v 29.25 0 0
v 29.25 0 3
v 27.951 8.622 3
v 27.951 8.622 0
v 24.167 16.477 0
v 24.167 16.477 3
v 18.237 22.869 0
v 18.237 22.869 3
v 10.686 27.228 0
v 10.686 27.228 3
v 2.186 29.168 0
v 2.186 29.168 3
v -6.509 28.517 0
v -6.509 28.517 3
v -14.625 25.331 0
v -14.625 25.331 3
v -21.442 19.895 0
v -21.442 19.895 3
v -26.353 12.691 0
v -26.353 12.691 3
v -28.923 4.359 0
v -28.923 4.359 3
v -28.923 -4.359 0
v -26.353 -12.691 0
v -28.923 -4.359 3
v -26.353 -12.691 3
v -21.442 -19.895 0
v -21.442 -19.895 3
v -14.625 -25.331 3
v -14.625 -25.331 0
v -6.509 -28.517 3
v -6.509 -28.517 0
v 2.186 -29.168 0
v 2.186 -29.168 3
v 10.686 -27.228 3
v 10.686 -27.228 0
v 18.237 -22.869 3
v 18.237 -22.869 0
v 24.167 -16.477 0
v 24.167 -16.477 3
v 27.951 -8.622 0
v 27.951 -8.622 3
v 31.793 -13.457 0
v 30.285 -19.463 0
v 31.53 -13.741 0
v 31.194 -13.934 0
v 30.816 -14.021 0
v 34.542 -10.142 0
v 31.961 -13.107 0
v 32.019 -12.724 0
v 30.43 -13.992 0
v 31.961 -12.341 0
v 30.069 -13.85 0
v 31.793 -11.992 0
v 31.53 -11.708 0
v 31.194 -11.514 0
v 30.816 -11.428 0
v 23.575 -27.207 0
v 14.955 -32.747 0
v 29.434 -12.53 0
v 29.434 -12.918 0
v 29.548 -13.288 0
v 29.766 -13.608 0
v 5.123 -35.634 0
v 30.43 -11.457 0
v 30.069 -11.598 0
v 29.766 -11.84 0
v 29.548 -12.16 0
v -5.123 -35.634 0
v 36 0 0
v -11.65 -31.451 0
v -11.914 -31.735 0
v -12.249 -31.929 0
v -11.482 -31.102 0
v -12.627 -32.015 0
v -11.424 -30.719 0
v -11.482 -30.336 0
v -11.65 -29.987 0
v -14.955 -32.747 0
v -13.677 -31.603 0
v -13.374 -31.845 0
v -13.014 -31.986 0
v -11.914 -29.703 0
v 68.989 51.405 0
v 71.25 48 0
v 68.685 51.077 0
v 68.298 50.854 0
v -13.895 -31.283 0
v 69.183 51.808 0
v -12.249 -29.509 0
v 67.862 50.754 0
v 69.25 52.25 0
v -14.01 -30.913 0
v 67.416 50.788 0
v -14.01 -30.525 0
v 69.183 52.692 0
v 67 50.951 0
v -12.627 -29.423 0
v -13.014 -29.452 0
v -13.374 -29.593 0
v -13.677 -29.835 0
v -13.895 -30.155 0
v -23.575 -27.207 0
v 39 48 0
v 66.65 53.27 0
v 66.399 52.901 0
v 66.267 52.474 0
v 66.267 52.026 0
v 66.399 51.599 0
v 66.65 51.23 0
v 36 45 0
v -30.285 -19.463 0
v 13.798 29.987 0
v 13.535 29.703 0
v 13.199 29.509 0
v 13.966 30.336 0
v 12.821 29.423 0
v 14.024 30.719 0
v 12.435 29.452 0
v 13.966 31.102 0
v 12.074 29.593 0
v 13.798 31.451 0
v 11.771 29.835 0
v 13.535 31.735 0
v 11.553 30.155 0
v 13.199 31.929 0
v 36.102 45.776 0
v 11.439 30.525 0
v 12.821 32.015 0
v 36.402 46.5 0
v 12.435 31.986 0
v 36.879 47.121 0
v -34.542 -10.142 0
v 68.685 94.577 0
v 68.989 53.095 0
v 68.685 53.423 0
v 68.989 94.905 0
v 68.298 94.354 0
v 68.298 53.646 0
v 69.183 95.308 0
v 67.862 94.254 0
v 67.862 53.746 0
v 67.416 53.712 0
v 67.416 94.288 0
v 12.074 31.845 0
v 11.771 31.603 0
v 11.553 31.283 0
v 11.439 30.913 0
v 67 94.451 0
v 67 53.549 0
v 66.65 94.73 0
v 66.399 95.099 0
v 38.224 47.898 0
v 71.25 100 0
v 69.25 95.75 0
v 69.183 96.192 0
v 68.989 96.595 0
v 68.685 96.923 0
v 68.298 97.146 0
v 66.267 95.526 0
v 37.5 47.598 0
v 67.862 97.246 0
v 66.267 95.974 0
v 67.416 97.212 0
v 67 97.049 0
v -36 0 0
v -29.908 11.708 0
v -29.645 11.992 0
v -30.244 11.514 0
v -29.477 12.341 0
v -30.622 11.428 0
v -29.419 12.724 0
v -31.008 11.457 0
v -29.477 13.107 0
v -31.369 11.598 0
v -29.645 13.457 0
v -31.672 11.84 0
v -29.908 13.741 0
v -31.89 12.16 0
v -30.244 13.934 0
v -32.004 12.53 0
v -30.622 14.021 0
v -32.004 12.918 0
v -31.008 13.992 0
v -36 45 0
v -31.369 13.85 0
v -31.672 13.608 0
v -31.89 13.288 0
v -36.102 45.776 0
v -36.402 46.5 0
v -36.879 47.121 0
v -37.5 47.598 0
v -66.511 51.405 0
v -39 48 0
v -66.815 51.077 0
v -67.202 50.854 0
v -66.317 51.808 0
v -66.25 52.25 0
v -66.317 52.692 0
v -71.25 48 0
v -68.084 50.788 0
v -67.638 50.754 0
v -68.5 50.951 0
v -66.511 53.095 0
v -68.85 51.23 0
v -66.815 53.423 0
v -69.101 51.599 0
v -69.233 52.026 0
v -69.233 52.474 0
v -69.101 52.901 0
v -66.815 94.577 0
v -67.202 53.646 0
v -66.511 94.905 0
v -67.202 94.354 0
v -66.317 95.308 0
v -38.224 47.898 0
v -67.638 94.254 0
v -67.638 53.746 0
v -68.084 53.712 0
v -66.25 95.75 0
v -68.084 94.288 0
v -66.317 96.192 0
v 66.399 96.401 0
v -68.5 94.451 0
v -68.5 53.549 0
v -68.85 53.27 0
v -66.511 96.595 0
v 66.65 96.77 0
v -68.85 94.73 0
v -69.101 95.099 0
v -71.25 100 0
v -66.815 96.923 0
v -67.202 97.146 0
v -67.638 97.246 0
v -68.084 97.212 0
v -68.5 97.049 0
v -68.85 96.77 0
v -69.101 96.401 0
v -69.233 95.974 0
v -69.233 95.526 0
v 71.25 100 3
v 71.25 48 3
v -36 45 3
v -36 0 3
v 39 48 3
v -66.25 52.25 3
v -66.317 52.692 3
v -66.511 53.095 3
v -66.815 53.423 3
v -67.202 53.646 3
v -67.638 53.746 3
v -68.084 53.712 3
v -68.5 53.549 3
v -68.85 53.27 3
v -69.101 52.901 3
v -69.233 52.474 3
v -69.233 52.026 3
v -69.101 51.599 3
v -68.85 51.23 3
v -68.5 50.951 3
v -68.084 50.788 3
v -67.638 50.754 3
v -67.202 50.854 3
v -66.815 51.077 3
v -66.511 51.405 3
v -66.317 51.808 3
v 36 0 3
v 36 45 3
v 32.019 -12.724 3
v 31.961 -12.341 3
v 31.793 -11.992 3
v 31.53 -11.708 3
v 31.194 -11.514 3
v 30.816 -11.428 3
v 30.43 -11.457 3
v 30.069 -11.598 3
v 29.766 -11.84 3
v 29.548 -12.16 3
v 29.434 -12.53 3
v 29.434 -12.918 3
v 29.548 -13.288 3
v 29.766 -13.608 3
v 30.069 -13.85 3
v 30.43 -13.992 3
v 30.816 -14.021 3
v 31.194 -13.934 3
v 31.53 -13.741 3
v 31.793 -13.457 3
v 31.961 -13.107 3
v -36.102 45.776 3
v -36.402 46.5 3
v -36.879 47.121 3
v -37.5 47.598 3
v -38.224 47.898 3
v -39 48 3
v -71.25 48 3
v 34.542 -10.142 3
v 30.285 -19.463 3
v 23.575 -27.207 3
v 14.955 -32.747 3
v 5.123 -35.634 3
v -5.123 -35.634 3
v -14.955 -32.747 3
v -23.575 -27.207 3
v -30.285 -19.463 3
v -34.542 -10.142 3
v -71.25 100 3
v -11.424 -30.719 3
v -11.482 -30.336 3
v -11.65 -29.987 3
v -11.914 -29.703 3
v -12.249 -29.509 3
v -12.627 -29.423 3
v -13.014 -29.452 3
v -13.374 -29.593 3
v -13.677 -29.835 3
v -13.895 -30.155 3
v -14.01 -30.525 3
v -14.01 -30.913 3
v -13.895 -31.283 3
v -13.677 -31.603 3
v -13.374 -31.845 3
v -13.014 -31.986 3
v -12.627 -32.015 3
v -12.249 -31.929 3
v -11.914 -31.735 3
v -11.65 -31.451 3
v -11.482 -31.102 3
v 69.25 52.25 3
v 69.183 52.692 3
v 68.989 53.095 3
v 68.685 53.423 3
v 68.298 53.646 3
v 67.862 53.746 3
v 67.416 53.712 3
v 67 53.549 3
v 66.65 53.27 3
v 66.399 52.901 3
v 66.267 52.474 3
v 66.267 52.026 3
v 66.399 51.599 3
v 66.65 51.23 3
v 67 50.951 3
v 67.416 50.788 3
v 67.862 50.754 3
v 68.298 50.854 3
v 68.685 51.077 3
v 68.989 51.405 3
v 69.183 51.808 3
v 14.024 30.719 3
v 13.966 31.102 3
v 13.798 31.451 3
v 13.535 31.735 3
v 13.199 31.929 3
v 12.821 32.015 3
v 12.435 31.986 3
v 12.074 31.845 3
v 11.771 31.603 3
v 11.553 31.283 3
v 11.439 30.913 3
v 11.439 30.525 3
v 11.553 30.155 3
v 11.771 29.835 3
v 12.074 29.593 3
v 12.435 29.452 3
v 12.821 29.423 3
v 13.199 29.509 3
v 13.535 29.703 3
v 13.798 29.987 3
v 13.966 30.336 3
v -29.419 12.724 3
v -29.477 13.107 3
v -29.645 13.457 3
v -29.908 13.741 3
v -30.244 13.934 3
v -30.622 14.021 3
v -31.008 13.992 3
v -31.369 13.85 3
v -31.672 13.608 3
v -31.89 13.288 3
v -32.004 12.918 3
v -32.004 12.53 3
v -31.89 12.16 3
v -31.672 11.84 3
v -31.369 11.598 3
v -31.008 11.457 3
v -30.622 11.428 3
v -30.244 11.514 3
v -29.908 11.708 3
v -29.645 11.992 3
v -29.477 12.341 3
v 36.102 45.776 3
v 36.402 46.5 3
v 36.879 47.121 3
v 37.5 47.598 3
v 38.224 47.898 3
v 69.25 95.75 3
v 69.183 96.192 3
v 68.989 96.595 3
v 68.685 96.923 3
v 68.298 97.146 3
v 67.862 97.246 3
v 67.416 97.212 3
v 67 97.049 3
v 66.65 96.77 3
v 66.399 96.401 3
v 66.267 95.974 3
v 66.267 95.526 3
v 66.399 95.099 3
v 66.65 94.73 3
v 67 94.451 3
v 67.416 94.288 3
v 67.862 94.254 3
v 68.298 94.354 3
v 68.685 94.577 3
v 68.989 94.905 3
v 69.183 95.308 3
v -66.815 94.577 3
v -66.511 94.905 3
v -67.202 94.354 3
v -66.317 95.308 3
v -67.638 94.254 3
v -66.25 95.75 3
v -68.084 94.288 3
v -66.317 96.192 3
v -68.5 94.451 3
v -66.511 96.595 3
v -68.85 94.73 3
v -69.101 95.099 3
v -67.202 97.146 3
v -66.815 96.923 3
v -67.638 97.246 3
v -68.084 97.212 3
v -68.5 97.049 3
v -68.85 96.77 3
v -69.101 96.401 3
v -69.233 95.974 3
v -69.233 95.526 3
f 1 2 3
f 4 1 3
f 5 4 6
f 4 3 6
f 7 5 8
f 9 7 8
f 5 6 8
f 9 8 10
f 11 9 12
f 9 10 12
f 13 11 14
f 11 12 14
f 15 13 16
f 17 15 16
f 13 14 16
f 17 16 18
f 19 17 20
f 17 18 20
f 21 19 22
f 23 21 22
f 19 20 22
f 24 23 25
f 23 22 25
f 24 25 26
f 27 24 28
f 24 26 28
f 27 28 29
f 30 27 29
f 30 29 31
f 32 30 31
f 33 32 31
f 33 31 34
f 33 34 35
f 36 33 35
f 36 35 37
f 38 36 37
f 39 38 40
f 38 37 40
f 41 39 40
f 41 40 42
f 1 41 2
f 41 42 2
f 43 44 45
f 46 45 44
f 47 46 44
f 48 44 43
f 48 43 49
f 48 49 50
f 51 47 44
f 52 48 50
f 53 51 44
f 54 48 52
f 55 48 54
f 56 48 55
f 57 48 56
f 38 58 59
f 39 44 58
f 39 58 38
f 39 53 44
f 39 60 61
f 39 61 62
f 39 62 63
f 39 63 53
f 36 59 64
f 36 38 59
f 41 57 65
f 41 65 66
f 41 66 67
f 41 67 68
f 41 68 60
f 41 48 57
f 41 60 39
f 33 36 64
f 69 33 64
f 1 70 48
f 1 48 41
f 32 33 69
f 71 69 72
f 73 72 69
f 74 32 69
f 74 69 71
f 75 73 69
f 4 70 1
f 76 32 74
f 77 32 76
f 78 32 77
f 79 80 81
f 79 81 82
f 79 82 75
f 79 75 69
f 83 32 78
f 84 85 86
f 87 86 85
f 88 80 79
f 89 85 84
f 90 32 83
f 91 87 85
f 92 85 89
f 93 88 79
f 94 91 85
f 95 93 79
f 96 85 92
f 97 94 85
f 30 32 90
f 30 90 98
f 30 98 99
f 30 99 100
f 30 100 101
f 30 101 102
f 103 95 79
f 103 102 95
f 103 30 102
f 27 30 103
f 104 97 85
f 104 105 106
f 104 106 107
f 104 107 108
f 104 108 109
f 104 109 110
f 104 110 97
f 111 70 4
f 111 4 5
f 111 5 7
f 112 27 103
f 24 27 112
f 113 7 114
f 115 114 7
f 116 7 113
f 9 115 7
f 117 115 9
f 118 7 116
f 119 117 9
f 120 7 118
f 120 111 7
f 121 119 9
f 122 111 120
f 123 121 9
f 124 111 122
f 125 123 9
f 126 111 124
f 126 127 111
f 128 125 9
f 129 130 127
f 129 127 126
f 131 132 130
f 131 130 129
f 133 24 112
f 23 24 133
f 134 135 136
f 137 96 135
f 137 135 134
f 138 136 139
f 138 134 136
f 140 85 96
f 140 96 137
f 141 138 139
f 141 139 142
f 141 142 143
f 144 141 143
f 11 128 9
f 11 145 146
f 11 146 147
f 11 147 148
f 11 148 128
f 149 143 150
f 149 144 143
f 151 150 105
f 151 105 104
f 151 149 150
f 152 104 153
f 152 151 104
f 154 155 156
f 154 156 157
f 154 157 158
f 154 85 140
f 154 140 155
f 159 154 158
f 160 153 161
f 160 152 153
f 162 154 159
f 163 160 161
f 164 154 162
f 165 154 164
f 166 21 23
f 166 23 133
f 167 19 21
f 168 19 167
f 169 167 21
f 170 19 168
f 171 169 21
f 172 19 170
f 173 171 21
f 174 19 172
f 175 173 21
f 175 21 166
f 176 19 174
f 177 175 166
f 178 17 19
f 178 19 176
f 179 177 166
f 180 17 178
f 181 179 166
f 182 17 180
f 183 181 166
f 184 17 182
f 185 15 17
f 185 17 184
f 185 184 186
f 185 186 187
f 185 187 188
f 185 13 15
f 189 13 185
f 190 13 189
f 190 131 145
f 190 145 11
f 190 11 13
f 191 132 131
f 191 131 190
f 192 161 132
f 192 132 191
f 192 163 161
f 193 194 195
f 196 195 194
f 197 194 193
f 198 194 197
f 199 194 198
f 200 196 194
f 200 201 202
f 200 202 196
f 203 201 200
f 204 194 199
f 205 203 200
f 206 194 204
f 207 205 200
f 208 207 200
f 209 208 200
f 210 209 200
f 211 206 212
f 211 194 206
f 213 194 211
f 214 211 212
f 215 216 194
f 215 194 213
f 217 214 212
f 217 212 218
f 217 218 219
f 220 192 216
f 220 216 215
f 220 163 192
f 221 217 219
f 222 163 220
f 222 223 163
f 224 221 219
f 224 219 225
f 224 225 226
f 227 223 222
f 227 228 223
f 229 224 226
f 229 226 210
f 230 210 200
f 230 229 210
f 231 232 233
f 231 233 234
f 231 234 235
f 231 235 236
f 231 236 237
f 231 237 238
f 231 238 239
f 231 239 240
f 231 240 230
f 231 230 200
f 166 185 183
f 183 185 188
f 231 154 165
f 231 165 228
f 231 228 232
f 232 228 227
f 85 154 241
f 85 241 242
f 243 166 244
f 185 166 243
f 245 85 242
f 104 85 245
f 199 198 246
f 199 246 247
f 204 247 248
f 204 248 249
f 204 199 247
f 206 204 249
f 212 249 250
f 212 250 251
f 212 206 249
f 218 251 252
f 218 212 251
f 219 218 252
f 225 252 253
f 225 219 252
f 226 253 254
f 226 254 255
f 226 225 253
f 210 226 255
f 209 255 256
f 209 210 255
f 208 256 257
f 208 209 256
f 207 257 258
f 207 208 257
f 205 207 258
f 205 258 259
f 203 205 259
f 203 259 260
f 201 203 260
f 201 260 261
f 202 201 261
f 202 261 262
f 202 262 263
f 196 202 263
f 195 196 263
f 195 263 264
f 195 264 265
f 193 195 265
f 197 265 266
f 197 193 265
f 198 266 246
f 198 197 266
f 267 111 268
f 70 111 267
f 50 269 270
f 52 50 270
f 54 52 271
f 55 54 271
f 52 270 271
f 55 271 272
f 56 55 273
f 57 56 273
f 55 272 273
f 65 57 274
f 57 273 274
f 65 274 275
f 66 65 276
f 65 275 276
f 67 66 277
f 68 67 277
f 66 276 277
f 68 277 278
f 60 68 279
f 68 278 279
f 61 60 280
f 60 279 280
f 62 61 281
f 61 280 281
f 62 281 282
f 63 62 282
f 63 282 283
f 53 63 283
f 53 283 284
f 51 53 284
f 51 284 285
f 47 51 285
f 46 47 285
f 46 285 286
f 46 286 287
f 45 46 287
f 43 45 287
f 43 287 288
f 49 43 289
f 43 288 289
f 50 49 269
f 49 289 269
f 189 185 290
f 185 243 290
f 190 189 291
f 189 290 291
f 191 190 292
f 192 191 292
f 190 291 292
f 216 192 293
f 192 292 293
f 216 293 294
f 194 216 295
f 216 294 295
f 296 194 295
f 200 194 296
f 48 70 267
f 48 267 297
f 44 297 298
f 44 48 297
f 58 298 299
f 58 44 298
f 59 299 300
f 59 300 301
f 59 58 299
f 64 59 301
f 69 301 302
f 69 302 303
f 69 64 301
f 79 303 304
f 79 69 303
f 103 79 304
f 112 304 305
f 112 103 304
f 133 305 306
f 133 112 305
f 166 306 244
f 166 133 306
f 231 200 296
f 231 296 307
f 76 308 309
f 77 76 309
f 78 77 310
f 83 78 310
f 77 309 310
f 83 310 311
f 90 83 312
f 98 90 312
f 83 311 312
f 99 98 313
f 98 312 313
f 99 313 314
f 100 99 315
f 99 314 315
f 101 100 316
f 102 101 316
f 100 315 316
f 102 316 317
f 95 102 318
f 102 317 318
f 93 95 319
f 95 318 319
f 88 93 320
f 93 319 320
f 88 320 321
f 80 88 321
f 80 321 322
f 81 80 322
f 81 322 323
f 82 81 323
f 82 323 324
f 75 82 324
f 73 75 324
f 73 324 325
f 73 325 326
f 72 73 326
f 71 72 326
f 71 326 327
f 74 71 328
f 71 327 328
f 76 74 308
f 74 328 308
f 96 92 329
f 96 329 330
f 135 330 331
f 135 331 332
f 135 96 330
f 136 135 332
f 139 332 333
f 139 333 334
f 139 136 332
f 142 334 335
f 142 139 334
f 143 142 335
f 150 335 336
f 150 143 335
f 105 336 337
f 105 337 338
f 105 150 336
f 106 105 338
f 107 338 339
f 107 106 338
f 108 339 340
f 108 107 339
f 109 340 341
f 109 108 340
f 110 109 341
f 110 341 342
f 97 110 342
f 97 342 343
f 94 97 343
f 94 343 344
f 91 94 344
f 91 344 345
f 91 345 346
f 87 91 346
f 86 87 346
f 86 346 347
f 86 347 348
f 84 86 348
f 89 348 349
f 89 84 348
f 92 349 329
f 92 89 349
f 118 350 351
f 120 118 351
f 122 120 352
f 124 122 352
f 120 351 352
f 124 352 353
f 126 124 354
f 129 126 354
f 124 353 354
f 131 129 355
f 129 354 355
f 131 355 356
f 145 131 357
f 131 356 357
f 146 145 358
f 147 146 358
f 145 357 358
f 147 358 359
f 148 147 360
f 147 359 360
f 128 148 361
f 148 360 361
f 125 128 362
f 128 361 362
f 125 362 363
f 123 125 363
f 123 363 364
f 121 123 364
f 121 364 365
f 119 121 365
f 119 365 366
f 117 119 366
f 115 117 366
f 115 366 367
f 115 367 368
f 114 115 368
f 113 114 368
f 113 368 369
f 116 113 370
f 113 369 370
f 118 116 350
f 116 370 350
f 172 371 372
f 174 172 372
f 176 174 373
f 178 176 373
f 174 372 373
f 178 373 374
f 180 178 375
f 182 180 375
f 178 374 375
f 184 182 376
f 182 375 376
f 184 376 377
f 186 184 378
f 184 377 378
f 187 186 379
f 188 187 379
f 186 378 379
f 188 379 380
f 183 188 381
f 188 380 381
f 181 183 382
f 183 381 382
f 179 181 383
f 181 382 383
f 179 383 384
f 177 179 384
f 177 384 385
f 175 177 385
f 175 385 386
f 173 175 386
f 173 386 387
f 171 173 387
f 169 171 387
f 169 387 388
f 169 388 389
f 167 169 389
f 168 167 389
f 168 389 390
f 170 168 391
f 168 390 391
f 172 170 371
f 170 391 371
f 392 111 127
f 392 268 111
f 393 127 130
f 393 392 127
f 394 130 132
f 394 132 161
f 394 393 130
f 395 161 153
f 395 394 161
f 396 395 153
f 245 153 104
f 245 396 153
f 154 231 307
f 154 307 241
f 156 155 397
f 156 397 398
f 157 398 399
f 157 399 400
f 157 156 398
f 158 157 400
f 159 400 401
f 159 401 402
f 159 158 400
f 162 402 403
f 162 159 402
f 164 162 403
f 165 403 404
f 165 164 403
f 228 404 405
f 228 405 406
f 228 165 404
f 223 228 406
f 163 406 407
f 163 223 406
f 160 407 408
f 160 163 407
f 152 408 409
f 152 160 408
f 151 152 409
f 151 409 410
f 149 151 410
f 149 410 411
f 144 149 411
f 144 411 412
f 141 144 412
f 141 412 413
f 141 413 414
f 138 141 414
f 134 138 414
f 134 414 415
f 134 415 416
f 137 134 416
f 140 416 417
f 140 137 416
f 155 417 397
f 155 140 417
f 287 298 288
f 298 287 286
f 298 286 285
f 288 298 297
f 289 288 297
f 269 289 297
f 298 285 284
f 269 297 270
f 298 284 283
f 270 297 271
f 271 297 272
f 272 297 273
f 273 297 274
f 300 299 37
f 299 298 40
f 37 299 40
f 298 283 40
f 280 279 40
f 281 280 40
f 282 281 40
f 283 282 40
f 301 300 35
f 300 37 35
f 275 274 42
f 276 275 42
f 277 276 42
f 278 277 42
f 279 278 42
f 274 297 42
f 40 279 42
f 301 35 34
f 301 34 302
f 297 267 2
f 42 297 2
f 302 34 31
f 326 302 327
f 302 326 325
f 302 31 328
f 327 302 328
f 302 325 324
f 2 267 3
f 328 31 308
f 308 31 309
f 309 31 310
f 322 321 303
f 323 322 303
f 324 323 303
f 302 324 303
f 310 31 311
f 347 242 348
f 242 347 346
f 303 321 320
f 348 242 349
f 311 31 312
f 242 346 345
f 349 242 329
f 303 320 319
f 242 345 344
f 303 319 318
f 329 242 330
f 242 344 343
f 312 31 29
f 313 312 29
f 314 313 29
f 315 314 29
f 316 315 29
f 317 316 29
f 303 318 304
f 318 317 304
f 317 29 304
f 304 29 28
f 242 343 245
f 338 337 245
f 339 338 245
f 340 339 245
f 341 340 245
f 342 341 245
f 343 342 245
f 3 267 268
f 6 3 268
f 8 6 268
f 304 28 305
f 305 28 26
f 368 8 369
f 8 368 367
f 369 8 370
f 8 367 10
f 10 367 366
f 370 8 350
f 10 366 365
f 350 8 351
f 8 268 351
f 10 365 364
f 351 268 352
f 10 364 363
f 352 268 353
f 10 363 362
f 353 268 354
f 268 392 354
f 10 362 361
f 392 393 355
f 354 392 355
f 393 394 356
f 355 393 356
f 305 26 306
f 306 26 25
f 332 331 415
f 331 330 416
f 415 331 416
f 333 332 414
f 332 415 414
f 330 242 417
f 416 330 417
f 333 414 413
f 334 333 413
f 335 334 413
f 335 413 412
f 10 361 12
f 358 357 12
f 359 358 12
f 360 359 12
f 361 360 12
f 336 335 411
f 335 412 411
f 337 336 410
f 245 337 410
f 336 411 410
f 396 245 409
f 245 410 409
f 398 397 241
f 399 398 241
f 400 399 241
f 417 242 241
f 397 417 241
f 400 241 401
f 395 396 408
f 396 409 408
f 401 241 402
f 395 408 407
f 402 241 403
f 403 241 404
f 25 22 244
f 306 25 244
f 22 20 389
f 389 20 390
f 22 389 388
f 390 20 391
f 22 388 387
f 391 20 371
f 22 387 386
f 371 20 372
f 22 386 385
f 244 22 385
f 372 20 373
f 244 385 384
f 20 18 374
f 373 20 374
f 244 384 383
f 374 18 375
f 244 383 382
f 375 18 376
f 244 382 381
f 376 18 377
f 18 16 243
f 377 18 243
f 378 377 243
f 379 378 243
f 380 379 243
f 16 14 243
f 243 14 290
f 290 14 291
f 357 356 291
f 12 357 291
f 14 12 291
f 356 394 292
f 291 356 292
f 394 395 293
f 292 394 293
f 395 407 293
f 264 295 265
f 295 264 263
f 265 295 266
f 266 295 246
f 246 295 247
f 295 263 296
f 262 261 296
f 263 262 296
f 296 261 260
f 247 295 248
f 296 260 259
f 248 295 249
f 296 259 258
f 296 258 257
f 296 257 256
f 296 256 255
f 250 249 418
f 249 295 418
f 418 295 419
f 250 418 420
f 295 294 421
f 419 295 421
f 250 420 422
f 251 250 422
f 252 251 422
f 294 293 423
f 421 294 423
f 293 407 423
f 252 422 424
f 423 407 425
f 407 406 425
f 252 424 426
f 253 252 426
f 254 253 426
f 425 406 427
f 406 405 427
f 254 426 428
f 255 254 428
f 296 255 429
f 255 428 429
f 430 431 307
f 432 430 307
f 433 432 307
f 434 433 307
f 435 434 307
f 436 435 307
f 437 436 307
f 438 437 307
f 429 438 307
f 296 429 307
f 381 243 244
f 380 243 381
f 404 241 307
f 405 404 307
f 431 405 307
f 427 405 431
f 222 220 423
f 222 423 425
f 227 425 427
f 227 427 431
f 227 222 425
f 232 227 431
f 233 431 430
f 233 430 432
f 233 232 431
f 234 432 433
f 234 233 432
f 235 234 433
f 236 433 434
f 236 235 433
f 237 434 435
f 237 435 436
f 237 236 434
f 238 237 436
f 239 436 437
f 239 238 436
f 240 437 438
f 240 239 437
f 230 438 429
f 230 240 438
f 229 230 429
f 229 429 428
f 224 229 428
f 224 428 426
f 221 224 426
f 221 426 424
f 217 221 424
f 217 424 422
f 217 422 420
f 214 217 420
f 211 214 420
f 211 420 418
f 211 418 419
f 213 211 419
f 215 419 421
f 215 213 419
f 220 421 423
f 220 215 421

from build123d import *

# Parameters (mm, degrees)
SKETCH1_R           = 1.5
BOSS_EXTRUDE1_DEPTH = 3
FILLET1_R           = 3
SKETCH2_R           = 29.25
SKETCH2_R_2         = 1.3
CUT_EXTRUDE1_DEPTH  = 3


with BuildPart() as part:
    # Sketch1 → Boss-Extrude1 (new body)
    with BuildSketch(Plane.XY):
        with BuildLine():
            Line((-36, 0), (-36, 48))
            Line((-36, 48), (-71.25, 48))
            Line((-71.25, 48), (-71.25, 100))
            Line((-71.25, 100), (71.25, 100))
            Line((71.25, 100), (71.25, 48))
            Line((71.25, 48), (36, 48))
            Line((36, 48), (36, 0))
            ThreePointArc((36, 0), (0, -36), (-36, 0))
        make_face()
        with Locations((-67.75, 95.75)):
            Circle(SKETCH1_R, mode=Mode.SUBTRACT)
        with Locations((67.75, 95.75)):
            Circle(SKETCH1_R, mode=Mode.SUBTRACT)
        with Locations((67.75, 52.25)):
            Circle(SKETCH1_R, mode=Mode.SUBTRACT)
        with Locations((-67.75, 52.25)):
            Circle(SKETCH1_R, mode=Mode.SUBTRACT)
    extrude(amount=BOSS_EXTRUDE1_DEPTH)

    # Fillet1
    fillet1_edges = [part.edges().sort_by_distance(p)[0] for p in [
        (36, 48, 1.5),
        (-36, 48, 1.5),
    ]]
    fillet(fillet1_edges, radius=FILLET1_R)

    # Sketch2 → Cut-Extrude1 (cut)
    with BuildSketch(Plane.XY.offset(3)):
        Circle(SKETCH2_R)
        with Locations((12.724224126, 30.718994456)):
            Circle(SKETCH2_R_2)
        with Locations((30.718994456, -12.724224126)):
            Circle(SKETCH2_R_2)
        with Locations((-12.724224126, -30.718994456)):
            Circle(SKETCH2_R_2)
        with Locations((-30.718994456, 12.724224126)):
            Circle(SKETCH2_R_2)
    extrude(amount=-CUT_EXTRUDE1_DEPTH, mode=Mode.SUBTRACT)


solid = part.part
